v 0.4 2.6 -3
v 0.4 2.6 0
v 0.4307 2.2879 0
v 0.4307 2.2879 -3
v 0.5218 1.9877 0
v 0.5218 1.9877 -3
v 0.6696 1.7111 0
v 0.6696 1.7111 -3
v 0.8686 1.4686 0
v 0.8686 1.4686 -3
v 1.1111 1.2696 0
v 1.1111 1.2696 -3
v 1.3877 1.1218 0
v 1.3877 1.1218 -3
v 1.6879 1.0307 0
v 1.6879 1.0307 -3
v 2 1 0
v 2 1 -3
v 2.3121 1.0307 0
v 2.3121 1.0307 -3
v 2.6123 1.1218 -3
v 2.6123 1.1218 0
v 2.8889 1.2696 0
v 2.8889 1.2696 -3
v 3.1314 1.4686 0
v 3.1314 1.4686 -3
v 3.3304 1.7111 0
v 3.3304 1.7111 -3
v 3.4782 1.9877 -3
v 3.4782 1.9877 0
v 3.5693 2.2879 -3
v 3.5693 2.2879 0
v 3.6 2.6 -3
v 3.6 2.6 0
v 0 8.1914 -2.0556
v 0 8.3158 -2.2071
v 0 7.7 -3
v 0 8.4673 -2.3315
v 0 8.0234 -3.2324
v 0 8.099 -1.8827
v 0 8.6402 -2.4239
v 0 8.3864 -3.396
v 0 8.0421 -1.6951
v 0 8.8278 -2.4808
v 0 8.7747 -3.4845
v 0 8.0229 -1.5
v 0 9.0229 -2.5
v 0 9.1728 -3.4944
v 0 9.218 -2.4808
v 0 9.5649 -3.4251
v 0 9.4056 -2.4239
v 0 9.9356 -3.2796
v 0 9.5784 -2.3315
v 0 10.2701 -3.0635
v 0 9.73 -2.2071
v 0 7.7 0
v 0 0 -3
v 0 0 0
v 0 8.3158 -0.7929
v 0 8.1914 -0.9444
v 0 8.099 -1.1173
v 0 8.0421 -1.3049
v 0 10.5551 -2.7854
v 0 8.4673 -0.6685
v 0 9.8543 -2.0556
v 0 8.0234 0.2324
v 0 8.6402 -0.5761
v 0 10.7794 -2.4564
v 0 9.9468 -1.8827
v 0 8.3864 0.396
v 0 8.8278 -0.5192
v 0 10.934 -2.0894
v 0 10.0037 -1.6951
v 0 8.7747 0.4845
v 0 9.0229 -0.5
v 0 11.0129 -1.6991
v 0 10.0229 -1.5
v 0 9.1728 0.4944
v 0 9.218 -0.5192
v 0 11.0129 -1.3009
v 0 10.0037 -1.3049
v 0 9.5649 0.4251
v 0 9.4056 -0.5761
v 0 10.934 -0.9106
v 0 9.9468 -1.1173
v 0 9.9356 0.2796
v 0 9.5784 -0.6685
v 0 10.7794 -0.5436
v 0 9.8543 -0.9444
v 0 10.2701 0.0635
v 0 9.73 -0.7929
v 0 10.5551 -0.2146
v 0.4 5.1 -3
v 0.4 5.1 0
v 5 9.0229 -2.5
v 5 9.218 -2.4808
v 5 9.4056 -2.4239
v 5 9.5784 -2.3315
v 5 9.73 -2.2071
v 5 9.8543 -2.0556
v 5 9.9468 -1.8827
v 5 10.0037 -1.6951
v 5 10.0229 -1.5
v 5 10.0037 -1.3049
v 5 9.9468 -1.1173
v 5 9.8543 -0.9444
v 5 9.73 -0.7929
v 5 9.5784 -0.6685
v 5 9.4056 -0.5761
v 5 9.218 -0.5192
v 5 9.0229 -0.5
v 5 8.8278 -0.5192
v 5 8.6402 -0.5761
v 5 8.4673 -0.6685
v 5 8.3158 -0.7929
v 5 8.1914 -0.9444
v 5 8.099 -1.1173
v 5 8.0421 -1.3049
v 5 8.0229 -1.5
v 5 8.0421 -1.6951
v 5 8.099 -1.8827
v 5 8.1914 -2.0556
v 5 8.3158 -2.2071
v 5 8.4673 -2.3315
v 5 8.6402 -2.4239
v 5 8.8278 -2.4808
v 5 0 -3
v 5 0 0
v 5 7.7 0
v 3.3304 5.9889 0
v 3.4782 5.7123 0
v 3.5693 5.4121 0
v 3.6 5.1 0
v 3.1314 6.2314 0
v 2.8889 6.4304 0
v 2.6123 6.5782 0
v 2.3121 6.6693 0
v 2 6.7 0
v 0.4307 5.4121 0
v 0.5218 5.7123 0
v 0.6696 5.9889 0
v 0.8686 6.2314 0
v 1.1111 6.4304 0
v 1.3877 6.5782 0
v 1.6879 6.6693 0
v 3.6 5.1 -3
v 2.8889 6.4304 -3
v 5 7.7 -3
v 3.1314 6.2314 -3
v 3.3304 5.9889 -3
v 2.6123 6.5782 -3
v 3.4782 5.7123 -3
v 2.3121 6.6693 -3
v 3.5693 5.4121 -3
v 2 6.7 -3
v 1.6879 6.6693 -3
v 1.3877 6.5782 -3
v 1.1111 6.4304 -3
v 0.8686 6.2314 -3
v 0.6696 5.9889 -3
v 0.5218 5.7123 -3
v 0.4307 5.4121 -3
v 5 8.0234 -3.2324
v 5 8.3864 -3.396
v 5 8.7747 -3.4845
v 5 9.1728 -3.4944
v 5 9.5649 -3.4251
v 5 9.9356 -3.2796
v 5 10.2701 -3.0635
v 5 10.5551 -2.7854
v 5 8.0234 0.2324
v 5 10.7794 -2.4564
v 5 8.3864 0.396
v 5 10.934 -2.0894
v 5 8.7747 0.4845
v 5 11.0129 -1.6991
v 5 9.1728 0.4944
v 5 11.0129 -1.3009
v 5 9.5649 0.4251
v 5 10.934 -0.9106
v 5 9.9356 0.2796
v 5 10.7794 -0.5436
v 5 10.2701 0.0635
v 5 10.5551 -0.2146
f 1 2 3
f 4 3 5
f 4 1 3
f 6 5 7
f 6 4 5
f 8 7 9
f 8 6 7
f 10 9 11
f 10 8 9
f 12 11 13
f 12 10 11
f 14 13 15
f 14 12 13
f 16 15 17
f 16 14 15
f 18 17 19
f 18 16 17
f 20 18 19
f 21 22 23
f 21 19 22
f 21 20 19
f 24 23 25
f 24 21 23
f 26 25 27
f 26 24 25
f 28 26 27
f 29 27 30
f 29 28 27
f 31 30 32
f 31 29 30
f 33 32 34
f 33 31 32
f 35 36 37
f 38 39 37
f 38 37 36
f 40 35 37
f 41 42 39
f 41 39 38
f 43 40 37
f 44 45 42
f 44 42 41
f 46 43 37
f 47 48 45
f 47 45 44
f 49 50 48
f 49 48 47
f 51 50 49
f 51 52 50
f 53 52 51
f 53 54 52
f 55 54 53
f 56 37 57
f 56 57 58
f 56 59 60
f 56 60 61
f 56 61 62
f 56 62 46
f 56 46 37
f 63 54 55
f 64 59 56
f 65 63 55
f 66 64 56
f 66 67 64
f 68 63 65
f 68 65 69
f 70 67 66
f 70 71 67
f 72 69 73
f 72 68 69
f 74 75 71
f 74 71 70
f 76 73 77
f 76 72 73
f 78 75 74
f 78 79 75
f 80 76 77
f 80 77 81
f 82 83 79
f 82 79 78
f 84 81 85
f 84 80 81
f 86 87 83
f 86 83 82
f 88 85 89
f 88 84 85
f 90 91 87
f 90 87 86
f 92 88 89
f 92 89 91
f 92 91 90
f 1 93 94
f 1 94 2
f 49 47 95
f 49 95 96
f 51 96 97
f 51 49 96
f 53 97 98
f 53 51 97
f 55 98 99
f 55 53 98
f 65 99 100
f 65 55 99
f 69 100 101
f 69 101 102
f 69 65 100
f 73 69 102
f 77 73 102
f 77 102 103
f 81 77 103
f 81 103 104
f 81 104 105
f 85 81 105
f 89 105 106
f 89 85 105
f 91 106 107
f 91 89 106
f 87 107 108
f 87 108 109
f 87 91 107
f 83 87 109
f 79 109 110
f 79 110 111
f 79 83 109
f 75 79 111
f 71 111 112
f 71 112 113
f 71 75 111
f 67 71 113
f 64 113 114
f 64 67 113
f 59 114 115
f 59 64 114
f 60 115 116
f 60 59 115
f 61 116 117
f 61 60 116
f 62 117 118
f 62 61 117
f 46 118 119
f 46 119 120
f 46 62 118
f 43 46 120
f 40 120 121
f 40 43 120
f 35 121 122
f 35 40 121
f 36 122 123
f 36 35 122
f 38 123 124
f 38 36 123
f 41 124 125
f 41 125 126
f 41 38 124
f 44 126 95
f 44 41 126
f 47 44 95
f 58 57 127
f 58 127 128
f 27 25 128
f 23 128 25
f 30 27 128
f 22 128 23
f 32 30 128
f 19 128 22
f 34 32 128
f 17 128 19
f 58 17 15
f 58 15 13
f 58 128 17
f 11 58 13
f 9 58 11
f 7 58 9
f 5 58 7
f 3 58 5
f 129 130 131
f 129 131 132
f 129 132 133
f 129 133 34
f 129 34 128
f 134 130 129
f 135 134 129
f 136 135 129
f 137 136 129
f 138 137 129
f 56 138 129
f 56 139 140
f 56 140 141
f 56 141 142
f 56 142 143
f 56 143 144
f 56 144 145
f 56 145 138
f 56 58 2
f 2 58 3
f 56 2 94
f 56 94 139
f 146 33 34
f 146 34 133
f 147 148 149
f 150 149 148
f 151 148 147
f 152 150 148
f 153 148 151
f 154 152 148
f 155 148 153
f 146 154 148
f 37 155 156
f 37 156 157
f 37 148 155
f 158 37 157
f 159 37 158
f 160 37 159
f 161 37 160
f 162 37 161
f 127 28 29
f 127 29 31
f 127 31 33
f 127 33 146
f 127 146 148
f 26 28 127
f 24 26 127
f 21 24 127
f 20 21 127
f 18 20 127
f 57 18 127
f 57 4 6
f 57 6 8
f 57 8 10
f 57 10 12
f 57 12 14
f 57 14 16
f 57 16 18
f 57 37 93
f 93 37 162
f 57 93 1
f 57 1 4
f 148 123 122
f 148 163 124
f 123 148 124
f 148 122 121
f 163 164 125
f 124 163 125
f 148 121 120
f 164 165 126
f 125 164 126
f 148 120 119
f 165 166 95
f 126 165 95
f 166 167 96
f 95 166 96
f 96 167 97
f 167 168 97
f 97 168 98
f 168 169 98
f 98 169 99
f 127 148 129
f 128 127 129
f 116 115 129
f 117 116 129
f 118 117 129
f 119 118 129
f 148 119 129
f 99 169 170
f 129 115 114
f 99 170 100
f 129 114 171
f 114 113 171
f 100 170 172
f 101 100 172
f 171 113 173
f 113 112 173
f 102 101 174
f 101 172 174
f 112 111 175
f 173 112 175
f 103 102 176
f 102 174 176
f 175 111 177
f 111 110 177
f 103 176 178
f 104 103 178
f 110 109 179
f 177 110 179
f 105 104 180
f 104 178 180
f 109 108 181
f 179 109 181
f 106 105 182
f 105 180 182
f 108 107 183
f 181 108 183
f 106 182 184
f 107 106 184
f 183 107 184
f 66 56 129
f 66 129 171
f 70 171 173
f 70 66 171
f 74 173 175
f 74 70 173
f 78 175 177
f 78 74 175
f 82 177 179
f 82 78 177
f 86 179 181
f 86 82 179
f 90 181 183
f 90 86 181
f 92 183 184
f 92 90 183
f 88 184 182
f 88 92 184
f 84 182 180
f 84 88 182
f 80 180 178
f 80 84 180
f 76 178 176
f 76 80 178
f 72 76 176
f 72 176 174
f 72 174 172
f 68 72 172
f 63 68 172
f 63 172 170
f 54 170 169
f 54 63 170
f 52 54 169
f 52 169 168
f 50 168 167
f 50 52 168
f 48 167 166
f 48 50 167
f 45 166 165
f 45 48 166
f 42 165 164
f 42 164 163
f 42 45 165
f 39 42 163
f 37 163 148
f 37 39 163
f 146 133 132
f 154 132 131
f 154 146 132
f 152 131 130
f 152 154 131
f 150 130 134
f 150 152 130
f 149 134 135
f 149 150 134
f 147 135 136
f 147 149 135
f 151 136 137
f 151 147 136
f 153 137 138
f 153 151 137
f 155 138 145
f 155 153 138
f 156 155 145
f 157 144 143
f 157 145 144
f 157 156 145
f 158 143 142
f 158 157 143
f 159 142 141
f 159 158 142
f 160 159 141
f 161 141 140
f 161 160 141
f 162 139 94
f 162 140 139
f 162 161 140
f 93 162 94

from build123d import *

# Parameters (mm, degrees)
SKETCH1_R           = 1
BOSS_EXTRUDE1_DEPTH = 5
CUT_EXTRUDE1_DEPTH  = 13.599753478


with BuildPart() as part:
    # Sketch1 → Boss-Extrude1 (new body)
    with BuildSketch(Plane(origin=(0, 0, 0), x_dir=(0, 0, -1), z_dir=(1, 0, 0))):
        with BuildLine():
            ThreePointArc((0, 7.7), (1.5, 11.022875656), (3, 7.7))
            Line((3, 7.7), (3, 0))
            Line((3, 0), (0, 0))
            Line((0, 0), (0, 7.7))
        make_face()
        with Locations((1.5, 9.022875656)):
            Circle(SKETCH1_R, mode=Mode.SUBTRACT)
    extrude(amount=BOSS_EXTRUDE1_DEPTH)

    # Sketch2 → Cut-Extrude1 (cut, through all)
    with BuildSketch(Plane(origin=(0, 0, -3), x_dir=(-1, 0, 0), z_dir=(0, 0, -1))):
        with BuildLine():
            Line((-0.4, 5.1), (-0.4, 2.6))
            ThreePointArc((-0.4, 2.6), (-2, 1), (-3.6, 2.6))
            Line((-3.6, 2.6), (-3.6, 5.1))
            ThreePointArc((-3.6, 5.1), (-2, 6.7), (-0.4, 5.1))
        make_face()
    extrude(amount=-CUT_EXTRUDE1_DEPTH, mode=Mode.SUBTRACT)


solid = part.part
